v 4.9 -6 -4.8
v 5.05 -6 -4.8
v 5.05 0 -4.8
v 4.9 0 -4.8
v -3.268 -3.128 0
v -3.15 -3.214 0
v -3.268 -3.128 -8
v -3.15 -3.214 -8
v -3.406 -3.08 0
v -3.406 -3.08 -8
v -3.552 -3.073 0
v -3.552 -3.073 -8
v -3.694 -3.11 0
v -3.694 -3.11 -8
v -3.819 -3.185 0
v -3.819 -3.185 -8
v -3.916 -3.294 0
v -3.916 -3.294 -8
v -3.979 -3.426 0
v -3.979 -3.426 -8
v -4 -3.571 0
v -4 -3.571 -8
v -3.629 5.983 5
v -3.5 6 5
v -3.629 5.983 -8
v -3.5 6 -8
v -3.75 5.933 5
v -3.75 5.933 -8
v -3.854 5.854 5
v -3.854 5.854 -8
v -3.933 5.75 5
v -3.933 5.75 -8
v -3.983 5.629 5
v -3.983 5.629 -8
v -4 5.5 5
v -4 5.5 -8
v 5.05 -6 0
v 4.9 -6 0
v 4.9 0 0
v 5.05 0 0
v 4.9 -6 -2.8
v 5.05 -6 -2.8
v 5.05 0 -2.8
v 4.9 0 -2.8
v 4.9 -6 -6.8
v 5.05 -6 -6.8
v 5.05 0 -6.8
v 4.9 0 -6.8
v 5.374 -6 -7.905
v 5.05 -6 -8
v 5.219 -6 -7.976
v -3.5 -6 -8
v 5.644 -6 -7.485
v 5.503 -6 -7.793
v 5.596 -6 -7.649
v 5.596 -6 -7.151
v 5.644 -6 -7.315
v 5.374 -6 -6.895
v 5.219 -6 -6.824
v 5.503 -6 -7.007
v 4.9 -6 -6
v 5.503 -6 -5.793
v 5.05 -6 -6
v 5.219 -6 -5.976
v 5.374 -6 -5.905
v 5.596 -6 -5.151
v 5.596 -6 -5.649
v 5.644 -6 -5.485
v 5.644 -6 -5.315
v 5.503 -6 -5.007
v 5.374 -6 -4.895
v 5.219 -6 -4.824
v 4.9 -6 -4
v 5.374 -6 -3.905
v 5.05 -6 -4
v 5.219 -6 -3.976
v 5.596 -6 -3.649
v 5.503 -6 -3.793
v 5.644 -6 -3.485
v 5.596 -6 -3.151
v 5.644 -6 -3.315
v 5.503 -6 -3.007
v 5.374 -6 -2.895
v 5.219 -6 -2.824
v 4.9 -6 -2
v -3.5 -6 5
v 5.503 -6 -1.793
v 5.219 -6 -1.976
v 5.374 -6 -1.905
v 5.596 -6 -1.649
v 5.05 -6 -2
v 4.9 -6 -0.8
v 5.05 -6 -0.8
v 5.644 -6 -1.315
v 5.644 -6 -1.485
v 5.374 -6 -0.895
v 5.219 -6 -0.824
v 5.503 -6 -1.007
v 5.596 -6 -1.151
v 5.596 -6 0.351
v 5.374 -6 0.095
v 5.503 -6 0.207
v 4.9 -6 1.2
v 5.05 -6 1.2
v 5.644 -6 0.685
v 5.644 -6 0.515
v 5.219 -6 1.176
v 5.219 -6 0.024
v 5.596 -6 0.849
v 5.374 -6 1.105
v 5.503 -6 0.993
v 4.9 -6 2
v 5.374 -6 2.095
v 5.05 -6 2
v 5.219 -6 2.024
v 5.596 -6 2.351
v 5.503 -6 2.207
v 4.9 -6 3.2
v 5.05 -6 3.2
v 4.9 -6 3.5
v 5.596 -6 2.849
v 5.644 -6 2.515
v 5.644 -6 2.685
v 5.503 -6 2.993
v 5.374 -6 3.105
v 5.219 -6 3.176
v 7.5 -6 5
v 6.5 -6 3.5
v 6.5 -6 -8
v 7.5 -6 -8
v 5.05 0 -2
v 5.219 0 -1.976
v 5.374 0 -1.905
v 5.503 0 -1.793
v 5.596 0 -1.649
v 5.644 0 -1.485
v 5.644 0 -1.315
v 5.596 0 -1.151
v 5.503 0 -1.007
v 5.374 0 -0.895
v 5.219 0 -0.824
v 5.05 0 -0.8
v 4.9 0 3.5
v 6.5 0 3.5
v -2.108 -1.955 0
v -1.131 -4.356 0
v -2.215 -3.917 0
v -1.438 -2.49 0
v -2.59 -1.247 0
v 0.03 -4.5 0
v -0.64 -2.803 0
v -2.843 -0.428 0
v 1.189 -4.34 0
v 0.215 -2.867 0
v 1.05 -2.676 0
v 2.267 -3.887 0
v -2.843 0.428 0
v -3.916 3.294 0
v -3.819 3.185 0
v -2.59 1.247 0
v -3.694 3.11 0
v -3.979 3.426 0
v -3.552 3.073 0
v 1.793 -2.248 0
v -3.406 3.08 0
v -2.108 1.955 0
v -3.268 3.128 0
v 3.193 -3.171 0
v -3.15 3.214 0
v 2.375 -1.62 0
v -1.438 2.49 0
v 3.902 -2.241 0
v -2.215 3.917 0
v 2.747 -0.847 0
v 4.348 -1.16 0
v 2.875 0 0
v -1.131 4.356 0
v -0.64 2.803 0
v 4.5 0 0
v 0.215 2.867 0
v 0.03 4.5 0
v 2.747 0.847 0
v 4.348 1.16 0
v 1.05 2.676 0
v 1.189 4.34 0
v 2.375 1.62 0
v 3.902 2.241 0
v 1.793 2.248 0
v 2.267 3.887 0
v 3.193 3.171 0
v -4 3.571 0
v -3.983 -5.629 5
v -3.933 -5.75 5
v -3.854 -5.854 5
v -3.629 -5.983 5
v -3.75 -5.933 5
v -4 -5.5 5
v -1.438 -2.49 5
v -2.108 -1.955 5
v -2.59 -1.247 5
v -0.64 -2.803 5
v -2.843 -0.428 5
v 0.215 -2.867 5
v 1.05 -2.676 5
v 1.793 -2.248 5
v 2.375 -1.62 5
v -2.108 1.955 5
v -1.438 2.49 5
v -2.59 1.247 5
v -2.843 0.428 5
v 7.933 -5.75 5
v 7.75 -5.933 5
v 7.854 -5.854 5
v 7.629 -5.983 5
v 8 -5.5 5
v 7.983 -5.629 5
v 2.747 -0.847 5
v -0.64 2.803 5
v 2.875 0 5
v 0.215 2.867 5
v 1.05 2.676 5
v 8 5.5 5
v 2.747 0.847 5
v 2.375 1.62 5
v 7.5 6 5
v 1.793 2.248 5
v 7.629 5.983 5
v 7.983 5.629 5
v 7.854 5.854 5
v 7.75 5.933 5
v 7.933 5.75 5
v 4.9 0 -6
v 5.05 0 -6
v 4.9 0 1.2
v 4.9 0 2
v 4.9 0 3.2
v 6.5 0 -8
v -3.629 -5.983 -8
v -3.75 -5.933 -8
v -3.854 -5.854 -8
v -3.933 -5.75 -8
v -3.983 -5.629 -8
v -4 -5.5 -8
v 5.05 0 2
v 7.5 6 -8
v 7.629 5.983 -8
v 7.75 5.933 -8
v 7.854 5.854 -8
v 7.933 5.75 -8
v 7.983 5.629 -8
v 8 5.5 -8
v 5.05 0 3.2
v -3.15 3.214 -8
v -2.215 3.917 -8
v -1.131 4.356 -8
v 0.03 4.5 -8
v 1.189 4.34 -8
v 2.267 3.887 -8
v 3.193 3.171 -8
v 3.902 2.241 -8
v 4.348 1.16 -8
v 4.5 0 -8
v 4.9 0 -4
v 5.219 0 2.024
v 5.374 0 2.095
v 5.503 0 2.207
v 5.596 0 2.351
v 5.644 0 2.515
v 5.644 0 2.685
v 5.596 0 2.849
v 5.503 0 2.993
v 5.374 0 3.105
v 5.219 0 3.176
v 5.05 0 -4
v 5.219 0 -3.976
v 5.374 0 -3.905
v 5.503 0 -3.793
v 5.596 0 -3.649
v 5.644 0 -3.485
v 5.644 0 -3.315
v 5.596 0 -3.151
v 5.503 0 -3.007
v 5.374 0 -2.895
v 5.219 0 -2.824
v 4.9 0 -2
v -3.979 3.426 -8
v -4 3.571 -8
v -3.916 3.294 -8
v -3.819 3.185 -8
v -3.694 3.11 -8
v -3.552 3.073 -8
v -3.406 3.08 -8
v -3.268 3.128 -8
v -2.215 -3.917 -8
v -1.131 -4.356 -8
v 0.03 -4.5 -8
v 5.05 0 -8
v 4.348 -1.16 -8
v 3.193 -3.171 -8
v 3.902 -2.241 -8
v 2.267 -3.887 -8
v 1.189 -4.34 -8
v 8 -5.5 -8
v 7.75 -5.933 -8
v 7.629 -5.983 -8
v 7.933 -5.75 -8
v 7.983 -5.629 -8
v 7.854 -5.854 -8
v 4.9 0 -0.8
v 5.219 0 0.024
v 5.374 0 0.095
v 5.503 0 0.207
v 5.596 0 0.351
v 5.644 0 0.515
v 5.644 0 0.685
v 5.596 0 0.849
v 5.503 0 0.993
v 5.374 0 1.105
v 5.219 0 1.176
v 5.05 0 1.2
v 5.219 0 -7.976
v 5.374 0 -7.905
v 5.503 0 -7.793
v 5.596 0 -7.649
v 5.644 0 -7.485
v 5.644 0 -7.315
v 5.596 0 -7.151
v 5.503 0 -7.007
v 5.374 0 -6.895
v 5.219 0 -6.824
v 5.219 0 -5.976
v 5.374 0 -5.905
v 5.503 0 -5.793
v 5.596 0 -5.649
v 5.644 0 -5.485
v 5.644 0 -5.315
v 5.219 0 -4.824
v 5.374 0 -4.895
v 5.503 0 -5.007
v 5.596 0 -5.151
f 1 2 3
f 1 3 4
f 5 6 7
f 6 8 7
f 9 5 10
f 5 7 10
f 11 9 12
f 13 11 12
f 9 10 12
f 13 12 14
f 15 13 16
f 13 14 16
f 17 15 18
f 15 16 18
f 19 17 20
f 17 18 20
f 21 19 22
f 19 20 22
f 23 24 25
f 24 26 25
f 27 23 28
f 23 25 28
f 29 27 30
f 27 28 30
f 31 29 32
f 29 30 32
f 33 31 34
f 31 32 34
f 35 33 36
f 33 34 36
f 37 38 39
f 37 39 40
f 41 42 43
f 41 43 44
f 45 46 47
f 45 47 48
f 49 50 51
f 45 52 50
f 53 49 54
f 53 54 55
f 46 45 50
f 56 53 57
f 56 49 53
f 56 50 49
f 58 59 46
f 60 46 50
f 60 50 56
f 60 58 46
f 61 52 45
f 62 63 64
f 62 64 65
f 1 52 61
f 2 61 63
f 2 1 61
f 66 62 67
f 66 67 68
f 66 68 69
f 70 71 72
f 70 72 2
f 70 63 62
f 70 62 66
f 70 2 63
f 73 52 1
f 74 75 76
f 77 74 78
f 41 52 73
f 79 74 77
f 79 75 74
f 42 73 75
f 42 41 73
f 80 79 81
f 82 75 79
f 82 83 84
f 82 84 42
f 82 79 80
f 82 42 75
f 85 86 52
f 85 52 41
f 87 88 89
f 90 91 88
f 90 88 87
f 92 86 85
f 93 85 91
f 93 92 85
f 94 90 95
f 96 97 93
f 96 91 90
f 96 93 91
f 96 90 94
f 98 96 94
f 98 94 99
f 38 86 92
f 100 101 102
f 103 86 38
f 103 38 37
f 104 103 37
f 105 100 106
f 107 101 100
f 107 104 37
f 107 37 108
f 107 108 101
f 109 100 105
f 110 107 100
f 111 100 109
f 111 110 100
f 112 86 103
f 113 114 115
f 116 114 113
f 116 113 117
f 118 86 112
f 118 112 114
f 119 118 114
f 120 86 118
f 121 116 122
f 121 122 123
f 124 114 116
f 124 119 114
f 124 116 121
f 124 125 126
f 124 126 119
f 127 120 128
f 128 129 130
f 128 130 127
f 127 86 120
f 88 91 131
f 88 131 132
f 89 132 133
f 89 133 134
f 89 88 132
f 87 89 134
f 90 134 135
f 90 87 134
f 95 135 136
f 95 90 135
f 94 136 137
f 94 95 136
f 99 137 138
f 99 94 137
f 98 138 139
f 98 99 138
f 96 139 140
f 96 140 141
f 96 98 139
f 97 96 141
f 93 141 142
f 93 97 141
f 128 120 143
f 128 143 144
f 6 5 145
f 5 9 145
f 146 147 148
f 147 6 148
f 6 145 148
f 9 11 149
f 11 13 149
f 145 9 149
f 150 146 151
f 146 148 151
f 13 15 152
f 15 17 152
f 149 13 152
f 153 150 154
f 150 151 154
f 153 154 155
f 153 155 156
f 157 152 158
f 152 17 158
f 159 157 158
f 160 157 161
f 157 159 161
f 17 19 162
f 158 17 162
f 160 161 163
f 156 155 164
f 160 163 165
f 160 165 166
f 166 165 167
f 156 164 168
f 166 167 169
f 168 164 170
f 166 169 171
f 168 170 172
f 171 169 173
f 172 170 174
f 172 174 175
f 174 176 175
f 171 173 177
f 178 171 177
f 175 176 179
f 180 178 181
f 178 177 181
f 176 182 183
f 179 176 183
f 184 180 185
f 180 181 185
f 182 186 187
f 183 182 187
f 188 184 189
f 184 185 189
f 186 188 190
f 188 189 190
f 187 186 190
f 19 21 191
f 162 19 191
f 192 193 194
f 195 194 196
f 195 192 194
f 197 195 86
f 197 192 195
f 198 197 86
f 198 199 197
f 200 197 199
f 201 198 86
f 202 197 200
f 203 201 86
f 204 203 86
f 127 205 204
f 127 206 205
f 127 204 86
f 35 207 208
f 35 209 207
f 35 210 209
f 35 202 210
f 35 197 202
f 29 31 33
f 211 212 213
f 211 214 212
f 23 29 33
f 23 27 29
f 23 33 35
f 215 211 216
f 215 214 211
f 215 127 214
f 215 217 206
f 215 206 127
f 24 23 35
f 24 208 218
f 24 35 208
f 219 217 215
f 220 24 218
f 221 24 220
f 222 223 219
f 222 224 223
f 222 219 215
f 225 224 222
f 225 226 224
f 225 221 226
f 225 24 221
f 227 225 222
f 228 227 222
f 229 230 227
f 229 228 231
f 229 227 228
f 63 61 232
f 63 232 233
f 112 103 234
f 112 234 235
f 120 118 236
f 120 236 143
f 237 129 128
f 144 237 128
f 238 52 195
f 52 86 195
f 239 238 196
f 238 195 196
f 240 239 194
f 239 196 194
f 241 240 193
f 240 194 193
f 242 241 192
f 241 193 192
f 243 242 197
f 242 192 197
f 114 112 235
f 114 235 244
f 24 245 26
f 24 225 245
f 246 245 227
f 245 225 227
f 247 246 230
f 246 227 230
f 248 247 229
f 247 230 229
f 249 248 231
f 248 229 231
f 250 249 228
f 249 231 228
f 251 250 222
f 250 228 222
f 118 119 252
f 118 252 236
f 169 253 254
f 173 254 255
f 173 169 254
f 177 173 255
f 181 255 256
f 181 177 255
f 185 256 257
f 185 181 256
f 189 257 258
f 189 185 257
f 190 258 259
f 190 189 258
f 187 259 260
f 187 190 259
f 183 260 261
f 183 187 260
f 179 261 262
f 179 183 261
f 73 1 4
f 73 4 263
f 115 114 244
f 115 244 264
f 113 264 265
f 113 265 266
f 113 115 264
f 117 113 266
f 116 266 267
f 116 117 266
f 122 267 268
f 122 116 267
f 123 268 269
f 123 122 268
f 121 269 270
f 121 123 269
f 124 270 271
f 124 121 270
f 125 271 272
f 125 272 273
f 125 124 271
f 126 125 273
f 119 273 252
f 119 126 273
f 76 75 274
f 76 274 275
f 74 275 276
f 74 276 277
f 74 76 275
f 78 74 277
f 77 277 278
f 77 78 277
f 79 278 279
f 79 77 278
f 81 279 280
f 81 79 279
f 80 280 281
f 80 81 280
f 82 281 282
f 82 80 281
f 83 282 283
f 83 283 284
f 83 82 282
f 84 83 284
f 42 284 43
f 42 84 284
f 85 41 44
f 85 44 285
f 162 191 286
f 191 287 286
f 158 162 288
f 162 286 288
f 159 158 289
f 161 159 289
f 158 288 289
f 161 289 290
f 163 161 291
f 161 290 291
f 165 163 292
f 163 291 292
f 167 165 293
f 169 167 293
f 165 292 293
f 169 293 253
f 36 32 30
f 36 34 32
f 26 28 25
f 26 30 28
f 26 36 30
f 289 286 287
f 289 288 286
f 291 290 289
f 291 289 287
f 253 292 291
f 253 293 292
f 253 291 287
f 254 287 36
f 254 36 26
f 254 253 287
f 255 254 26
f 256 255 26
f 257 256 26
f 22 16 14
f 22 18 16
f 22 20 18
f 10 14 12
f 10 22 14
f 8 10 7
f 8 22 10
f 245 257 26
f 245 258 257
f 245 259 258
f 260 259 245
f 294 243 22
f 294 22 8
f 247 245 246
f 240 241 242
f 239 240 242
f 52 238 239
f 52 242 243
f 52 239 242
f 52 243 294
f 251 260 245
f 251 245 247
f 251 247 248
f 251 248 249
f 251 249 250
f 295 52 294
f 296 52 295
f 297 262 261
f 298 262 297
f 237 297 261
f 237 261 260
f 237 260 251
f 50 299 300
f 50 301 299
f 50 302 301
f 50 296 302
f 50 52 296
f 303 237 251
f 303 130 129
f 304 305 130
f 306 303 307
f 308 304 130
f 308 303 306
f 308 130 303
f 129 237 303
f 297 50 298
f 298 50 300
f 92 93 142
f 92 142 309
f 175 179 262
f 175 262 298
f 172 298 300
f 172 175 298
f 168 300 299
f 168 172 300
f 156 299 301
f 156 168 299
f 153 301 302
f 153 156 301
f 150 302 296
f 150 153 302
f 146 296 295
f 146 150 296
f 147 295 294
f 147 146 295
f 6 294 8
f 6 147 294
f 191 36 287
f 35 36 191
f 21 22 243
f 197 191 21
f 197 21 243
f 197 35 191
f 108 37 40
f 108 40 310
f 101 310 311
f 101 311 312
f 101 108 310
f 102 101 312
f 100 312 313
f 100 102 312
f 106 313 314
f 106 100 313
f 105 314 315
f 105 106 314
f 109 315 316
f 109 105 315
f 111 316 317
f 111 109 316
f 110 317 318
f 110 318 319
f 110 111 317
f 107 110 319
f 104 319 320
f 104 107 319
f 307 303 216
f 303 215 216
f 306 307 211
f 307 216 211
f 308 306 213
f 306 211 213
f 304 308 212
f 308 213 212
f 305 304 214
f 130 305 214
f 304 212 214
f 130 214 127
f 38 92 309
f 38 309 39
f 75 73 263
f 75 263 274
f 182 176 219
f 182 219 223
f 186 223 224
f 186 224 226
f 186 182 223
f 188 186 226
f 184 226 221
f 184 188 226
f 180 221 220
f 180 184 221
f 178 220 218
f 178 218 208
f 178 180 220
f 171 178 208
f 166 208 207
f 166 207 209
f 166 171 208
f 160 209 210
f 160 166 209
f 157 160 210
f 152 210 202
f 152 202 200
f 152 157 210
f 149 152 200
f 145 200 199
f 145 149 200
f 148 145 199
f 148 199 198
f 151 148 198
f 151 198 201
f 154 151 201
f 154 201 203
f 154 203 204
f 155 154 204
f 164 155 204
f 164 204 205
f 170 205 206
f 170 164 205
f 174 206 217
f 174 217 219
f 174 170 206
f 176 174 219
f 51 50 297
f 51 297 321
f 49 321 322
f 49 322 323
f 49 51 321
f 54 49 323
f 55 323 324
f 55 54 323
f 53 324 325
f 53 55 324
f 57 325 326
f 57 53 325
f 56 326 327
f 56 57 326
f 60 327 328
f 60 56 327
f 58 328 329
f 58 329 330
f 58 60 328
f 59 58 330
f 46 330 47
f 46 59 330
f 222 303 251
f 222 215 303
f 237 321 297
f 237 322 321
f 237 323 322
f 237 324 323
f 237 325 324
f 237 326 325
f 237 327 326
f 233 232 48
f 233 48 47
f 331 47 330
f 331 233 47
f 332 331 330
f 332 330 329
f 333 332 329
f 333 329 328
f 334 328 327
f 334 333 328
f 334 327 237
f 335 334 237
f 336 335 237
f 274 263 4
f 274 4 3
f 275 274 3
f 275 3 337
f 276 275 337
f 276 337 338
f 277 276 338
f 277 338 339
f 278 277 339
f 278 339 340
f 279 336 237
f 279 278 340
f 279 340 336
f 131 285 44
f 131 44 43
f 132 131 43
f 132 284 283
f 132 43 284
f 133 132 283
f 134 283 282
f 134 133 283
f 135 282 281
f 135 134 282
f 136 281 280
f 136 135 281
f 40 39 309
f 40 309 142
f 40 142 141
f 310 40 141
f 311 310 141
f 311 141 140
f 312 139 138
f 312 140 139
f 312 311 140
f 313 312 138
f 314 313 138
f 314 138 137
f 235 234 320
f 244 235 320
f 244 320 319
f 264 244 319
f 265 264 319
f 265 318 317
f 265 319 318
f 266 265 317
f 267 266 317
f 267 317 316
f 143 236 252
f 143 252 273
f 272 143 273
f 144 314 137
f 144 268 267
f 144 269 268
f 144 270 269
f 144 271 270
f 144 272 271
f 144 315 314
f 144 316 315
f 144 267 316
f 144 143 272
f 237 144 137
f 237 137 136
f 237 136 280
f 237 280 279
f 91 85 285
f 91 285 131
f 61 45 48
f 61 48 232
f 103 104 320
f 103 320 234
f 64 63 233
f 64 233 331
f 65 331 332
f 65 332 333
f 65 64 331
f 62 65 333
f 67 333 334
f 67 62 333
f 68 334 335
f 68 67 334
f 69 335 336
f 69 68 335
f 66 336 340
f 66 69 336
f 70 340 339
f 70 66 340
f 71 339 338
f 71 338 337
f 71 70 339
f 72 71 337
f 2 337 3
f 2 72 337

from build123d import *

# Parameters (mm, degrees)
SKETCH1_R           = 2.875
BOSS_EXTRUDE1_DEPTH = 5
BOSS_EXTRUDE3_DEPTH = 8
FILLET1_R           = 0.5
SKETCH2_W           = 1.6
SKETCH2_H           = 11.5
CUT_EXTRUDE1_DEPTH  = 6
BOSS_EXTRUDE4_REACH = 18.492


with BuildPart() as part:
    # Sketch1 → Boss-Extrude1 (new body)
    with BuildSketch(Plane.XY):
        Polygon((-4, 0), (-4, -6), (8, -6), (8, 6), (-4, 6), align=None)
        Circle(SKETCH1_R, mode=Mode.SUBTRACT)
    extrude(amount=BOSS_EXTRUDE1_DEPTH)

    # Sketch1<4> → Boss-Extrude3 (add)
    with BuildSketch(Plane.XY):
        with BuildLine():
            ThreePointArc((4.5, 0), (1.060660172, -4.373213921), (-4, -2.061552813))
            Line((-4, -2.061552813), (-4, -6))
            Line((-4, -6), (8, -6))
            Line((8, -6), (8, 6))
            Line((8, 6), (-4, 6))
            Line((-4, 6), (-4, 2.061552813))
            ThreePointArc((-4, 2.061552813), (1.060660172, 4.373213921), (4.5, 0))
        make_face()
    extrude(amount=-BOSS_EXTRUDE3_DEPTH)

    # Fillet1
    fillet1_edges = [part.edges().sort_by_distance(p)[0] for p in [
        (-4, 6, -1.5),
        (8, 6, -1.5),
        (8, -6, -1.5),
        (-4, -6, -1.5),
        (-4, 2.061552813, -4),
        (-4, -2.061552813, -4),
    ]]
    fillet(fillet1_edges, radius=FILLET1_R)

    # Sketch2 → Cut-Extrude1 (cut)
    with BuildSketch(Plane.XZ.offset(6)):
        with Locations((5.7, -2.25)):
            Rectangle(SKETCH2_W, SKETCH2_H)
    extrude(amount=-CUT_EXTRUDE1_DEPTH, mode=Mode.SUBTRACT)

    # Sketch3 → Boss-Extrude4 (add, up to next)
    with BuildSketch(Plane.XZ.offset(6), mode=Mode.PRIVATE) as boss_extrude4_sk1:
        with BuildLine():
            Line((4.9, -8), (5.05, -8))
            ThreePointArc((5.05, -8), (5.65, -7.4), (5.05, -6.8))
            Line((5.05, -6.8), (4.9, -6.8))
            Line((4.9, -6.8), (4.9, -8))
        make_face()
    boss_extrude4_tool1 = extrude(boss_extrude4_sk1.sketch, amount=-BOSS_EXTRUDE4_REACH, mode=Mode.PRIVATE) - part.part
    # Sketch3 → Boss-Extrude4 (add, up to next)
    with BuildSketch(Plane.XZ.offset(6), mode=Mode.PRIVATE) as boss_extrude4_sk2:
        with BuildLine():
            Line((5.05, -4.8), (4.9, -4.8))
            Line((4.9, -4.8), (4.9, -6))
            Line((4.9, -6), (5.05, -6))
            ThreePointArc((5.05, -6), (5.65, -5.4), (5.05, -4.8))
        make_face()
    boss_extrude4_tool2 = extrude(boss_extrude4_sk2.sketch, amount=-BOSS_EXTRUDE4_REACH, mode=Mode.PRIVATE) - part.part
    # Sketch3 → Boss-Extrude4 (add, up to next)
    with BuildSketch(Plane.XZ.offset(6), mode=Mode.PRIVATE) as boss_extrude4_sk3:
        with BuildLine():
            Line((5.05, -2.8), (4.9, -2.8))
            Line((4.9, -2.8), (4.9, -4))
            Line((4.9, -4), (5.05, -4))
            ThreePointArc((5.05, -4), (5.65, -3.4), (5.05, -2.8))
        make_face()
    boss_extrude4_tool3 = extrude(boss_extrude4_sk3.sketch, amount=-BOSS_EXTRUDE4_REACH, mode=Mode.PRIVATE) - part.part
    # Sketch3 → Boss-Extrude4 (add, up to next)
    with BuildSketch(Plane.XZ.offset(6), mode=Mode.PRIVATE) as boss_extrude4_sk4:
        with BuildLine():
            Line((5.05, -0.8), (4.9, -0.8))
            Line((4.9, -0.8), (4.9, -2))
            Line((4.9, -2), (5.05, -2))
            ThreePointArc((5.05, -2), (5.65, -1.4), (5.05, -0.8))
        make_face()
    boss_extrude4_tool4 = extrude(boss_extrude4_sk4.sketch, amount=-BOSS_EXTRUDE4_REACH, mode=Mode.PRIVATE) - part.part
    # Sketch3 → Boss-Extrude4 (add, up to next)
    with BuildSketch(Plane.XZ.offset(6), mode=Mode.PRIVATE) as boss_extrude4_sk5:
        with BuildLine():
            Line((5.05, 1.2), (4.9, 1.2))
            Line((4.9, 1.2), (4.9, 0))
            Line((4.9, 0), (5.05, 0))
            ThreePointArc((5.05, 0), (5.65, 0.6), (5.05, 1.2))
        make_face()
    boss_extrude4_tool5 = extrude(boss_extrude4_sk5.sketch, amount=-BOSS_EXTRUDE4_REACH, mode=Mode.PRIVATE) - part.part
    # Sketch3 → Boss-Extrude4 (add, up to next)
    with BuildSketch(Plane.XZ.offset(6), mode=Mode.PRIVATE) as boss_extrude4_sk6:
        with BuildLine():
            Line((5.05, 3.2), (4.9, 3.2))
            Line((4.9, 3.2), (4.9, 2))
            Line((4.9, 2), (5.05, 2))
            ThreePointArc((5.05, 2), (5.65, 2.6), (5.05, 3.2))
        make_face()
    boss_extrude4_tool6 = extrude(boss_extrude4_sk6.sketch, amount=-BOSS_EXTRUDE4_REACH, mode=Mode.PRIVATE) - part.part
    add(boss_extrude4_tool1.solids().sort_by_distance((5.225053, -6, -7.4))[0])
    add(boss_extrude4_tool2.solids().sort_by_distance((5.225053, -6, -5.4))[0])
    add(boss_extrude4_tool3.solids().sort_by_distance((5.225053, -6, -3.4))[0])
    add(boss_extrude4_tool4.solids().sort_by_distance((5.225053, -6, -1.4))[0])
    add(boss_extrude4_tool5.solids().sort_by_distance((5.225053, -6, 0.6))[0])
    add(boss_extrude4_tool6.solids().sort_by_distance((5.225053, -6, 2.6))[0])


solid = part.part
